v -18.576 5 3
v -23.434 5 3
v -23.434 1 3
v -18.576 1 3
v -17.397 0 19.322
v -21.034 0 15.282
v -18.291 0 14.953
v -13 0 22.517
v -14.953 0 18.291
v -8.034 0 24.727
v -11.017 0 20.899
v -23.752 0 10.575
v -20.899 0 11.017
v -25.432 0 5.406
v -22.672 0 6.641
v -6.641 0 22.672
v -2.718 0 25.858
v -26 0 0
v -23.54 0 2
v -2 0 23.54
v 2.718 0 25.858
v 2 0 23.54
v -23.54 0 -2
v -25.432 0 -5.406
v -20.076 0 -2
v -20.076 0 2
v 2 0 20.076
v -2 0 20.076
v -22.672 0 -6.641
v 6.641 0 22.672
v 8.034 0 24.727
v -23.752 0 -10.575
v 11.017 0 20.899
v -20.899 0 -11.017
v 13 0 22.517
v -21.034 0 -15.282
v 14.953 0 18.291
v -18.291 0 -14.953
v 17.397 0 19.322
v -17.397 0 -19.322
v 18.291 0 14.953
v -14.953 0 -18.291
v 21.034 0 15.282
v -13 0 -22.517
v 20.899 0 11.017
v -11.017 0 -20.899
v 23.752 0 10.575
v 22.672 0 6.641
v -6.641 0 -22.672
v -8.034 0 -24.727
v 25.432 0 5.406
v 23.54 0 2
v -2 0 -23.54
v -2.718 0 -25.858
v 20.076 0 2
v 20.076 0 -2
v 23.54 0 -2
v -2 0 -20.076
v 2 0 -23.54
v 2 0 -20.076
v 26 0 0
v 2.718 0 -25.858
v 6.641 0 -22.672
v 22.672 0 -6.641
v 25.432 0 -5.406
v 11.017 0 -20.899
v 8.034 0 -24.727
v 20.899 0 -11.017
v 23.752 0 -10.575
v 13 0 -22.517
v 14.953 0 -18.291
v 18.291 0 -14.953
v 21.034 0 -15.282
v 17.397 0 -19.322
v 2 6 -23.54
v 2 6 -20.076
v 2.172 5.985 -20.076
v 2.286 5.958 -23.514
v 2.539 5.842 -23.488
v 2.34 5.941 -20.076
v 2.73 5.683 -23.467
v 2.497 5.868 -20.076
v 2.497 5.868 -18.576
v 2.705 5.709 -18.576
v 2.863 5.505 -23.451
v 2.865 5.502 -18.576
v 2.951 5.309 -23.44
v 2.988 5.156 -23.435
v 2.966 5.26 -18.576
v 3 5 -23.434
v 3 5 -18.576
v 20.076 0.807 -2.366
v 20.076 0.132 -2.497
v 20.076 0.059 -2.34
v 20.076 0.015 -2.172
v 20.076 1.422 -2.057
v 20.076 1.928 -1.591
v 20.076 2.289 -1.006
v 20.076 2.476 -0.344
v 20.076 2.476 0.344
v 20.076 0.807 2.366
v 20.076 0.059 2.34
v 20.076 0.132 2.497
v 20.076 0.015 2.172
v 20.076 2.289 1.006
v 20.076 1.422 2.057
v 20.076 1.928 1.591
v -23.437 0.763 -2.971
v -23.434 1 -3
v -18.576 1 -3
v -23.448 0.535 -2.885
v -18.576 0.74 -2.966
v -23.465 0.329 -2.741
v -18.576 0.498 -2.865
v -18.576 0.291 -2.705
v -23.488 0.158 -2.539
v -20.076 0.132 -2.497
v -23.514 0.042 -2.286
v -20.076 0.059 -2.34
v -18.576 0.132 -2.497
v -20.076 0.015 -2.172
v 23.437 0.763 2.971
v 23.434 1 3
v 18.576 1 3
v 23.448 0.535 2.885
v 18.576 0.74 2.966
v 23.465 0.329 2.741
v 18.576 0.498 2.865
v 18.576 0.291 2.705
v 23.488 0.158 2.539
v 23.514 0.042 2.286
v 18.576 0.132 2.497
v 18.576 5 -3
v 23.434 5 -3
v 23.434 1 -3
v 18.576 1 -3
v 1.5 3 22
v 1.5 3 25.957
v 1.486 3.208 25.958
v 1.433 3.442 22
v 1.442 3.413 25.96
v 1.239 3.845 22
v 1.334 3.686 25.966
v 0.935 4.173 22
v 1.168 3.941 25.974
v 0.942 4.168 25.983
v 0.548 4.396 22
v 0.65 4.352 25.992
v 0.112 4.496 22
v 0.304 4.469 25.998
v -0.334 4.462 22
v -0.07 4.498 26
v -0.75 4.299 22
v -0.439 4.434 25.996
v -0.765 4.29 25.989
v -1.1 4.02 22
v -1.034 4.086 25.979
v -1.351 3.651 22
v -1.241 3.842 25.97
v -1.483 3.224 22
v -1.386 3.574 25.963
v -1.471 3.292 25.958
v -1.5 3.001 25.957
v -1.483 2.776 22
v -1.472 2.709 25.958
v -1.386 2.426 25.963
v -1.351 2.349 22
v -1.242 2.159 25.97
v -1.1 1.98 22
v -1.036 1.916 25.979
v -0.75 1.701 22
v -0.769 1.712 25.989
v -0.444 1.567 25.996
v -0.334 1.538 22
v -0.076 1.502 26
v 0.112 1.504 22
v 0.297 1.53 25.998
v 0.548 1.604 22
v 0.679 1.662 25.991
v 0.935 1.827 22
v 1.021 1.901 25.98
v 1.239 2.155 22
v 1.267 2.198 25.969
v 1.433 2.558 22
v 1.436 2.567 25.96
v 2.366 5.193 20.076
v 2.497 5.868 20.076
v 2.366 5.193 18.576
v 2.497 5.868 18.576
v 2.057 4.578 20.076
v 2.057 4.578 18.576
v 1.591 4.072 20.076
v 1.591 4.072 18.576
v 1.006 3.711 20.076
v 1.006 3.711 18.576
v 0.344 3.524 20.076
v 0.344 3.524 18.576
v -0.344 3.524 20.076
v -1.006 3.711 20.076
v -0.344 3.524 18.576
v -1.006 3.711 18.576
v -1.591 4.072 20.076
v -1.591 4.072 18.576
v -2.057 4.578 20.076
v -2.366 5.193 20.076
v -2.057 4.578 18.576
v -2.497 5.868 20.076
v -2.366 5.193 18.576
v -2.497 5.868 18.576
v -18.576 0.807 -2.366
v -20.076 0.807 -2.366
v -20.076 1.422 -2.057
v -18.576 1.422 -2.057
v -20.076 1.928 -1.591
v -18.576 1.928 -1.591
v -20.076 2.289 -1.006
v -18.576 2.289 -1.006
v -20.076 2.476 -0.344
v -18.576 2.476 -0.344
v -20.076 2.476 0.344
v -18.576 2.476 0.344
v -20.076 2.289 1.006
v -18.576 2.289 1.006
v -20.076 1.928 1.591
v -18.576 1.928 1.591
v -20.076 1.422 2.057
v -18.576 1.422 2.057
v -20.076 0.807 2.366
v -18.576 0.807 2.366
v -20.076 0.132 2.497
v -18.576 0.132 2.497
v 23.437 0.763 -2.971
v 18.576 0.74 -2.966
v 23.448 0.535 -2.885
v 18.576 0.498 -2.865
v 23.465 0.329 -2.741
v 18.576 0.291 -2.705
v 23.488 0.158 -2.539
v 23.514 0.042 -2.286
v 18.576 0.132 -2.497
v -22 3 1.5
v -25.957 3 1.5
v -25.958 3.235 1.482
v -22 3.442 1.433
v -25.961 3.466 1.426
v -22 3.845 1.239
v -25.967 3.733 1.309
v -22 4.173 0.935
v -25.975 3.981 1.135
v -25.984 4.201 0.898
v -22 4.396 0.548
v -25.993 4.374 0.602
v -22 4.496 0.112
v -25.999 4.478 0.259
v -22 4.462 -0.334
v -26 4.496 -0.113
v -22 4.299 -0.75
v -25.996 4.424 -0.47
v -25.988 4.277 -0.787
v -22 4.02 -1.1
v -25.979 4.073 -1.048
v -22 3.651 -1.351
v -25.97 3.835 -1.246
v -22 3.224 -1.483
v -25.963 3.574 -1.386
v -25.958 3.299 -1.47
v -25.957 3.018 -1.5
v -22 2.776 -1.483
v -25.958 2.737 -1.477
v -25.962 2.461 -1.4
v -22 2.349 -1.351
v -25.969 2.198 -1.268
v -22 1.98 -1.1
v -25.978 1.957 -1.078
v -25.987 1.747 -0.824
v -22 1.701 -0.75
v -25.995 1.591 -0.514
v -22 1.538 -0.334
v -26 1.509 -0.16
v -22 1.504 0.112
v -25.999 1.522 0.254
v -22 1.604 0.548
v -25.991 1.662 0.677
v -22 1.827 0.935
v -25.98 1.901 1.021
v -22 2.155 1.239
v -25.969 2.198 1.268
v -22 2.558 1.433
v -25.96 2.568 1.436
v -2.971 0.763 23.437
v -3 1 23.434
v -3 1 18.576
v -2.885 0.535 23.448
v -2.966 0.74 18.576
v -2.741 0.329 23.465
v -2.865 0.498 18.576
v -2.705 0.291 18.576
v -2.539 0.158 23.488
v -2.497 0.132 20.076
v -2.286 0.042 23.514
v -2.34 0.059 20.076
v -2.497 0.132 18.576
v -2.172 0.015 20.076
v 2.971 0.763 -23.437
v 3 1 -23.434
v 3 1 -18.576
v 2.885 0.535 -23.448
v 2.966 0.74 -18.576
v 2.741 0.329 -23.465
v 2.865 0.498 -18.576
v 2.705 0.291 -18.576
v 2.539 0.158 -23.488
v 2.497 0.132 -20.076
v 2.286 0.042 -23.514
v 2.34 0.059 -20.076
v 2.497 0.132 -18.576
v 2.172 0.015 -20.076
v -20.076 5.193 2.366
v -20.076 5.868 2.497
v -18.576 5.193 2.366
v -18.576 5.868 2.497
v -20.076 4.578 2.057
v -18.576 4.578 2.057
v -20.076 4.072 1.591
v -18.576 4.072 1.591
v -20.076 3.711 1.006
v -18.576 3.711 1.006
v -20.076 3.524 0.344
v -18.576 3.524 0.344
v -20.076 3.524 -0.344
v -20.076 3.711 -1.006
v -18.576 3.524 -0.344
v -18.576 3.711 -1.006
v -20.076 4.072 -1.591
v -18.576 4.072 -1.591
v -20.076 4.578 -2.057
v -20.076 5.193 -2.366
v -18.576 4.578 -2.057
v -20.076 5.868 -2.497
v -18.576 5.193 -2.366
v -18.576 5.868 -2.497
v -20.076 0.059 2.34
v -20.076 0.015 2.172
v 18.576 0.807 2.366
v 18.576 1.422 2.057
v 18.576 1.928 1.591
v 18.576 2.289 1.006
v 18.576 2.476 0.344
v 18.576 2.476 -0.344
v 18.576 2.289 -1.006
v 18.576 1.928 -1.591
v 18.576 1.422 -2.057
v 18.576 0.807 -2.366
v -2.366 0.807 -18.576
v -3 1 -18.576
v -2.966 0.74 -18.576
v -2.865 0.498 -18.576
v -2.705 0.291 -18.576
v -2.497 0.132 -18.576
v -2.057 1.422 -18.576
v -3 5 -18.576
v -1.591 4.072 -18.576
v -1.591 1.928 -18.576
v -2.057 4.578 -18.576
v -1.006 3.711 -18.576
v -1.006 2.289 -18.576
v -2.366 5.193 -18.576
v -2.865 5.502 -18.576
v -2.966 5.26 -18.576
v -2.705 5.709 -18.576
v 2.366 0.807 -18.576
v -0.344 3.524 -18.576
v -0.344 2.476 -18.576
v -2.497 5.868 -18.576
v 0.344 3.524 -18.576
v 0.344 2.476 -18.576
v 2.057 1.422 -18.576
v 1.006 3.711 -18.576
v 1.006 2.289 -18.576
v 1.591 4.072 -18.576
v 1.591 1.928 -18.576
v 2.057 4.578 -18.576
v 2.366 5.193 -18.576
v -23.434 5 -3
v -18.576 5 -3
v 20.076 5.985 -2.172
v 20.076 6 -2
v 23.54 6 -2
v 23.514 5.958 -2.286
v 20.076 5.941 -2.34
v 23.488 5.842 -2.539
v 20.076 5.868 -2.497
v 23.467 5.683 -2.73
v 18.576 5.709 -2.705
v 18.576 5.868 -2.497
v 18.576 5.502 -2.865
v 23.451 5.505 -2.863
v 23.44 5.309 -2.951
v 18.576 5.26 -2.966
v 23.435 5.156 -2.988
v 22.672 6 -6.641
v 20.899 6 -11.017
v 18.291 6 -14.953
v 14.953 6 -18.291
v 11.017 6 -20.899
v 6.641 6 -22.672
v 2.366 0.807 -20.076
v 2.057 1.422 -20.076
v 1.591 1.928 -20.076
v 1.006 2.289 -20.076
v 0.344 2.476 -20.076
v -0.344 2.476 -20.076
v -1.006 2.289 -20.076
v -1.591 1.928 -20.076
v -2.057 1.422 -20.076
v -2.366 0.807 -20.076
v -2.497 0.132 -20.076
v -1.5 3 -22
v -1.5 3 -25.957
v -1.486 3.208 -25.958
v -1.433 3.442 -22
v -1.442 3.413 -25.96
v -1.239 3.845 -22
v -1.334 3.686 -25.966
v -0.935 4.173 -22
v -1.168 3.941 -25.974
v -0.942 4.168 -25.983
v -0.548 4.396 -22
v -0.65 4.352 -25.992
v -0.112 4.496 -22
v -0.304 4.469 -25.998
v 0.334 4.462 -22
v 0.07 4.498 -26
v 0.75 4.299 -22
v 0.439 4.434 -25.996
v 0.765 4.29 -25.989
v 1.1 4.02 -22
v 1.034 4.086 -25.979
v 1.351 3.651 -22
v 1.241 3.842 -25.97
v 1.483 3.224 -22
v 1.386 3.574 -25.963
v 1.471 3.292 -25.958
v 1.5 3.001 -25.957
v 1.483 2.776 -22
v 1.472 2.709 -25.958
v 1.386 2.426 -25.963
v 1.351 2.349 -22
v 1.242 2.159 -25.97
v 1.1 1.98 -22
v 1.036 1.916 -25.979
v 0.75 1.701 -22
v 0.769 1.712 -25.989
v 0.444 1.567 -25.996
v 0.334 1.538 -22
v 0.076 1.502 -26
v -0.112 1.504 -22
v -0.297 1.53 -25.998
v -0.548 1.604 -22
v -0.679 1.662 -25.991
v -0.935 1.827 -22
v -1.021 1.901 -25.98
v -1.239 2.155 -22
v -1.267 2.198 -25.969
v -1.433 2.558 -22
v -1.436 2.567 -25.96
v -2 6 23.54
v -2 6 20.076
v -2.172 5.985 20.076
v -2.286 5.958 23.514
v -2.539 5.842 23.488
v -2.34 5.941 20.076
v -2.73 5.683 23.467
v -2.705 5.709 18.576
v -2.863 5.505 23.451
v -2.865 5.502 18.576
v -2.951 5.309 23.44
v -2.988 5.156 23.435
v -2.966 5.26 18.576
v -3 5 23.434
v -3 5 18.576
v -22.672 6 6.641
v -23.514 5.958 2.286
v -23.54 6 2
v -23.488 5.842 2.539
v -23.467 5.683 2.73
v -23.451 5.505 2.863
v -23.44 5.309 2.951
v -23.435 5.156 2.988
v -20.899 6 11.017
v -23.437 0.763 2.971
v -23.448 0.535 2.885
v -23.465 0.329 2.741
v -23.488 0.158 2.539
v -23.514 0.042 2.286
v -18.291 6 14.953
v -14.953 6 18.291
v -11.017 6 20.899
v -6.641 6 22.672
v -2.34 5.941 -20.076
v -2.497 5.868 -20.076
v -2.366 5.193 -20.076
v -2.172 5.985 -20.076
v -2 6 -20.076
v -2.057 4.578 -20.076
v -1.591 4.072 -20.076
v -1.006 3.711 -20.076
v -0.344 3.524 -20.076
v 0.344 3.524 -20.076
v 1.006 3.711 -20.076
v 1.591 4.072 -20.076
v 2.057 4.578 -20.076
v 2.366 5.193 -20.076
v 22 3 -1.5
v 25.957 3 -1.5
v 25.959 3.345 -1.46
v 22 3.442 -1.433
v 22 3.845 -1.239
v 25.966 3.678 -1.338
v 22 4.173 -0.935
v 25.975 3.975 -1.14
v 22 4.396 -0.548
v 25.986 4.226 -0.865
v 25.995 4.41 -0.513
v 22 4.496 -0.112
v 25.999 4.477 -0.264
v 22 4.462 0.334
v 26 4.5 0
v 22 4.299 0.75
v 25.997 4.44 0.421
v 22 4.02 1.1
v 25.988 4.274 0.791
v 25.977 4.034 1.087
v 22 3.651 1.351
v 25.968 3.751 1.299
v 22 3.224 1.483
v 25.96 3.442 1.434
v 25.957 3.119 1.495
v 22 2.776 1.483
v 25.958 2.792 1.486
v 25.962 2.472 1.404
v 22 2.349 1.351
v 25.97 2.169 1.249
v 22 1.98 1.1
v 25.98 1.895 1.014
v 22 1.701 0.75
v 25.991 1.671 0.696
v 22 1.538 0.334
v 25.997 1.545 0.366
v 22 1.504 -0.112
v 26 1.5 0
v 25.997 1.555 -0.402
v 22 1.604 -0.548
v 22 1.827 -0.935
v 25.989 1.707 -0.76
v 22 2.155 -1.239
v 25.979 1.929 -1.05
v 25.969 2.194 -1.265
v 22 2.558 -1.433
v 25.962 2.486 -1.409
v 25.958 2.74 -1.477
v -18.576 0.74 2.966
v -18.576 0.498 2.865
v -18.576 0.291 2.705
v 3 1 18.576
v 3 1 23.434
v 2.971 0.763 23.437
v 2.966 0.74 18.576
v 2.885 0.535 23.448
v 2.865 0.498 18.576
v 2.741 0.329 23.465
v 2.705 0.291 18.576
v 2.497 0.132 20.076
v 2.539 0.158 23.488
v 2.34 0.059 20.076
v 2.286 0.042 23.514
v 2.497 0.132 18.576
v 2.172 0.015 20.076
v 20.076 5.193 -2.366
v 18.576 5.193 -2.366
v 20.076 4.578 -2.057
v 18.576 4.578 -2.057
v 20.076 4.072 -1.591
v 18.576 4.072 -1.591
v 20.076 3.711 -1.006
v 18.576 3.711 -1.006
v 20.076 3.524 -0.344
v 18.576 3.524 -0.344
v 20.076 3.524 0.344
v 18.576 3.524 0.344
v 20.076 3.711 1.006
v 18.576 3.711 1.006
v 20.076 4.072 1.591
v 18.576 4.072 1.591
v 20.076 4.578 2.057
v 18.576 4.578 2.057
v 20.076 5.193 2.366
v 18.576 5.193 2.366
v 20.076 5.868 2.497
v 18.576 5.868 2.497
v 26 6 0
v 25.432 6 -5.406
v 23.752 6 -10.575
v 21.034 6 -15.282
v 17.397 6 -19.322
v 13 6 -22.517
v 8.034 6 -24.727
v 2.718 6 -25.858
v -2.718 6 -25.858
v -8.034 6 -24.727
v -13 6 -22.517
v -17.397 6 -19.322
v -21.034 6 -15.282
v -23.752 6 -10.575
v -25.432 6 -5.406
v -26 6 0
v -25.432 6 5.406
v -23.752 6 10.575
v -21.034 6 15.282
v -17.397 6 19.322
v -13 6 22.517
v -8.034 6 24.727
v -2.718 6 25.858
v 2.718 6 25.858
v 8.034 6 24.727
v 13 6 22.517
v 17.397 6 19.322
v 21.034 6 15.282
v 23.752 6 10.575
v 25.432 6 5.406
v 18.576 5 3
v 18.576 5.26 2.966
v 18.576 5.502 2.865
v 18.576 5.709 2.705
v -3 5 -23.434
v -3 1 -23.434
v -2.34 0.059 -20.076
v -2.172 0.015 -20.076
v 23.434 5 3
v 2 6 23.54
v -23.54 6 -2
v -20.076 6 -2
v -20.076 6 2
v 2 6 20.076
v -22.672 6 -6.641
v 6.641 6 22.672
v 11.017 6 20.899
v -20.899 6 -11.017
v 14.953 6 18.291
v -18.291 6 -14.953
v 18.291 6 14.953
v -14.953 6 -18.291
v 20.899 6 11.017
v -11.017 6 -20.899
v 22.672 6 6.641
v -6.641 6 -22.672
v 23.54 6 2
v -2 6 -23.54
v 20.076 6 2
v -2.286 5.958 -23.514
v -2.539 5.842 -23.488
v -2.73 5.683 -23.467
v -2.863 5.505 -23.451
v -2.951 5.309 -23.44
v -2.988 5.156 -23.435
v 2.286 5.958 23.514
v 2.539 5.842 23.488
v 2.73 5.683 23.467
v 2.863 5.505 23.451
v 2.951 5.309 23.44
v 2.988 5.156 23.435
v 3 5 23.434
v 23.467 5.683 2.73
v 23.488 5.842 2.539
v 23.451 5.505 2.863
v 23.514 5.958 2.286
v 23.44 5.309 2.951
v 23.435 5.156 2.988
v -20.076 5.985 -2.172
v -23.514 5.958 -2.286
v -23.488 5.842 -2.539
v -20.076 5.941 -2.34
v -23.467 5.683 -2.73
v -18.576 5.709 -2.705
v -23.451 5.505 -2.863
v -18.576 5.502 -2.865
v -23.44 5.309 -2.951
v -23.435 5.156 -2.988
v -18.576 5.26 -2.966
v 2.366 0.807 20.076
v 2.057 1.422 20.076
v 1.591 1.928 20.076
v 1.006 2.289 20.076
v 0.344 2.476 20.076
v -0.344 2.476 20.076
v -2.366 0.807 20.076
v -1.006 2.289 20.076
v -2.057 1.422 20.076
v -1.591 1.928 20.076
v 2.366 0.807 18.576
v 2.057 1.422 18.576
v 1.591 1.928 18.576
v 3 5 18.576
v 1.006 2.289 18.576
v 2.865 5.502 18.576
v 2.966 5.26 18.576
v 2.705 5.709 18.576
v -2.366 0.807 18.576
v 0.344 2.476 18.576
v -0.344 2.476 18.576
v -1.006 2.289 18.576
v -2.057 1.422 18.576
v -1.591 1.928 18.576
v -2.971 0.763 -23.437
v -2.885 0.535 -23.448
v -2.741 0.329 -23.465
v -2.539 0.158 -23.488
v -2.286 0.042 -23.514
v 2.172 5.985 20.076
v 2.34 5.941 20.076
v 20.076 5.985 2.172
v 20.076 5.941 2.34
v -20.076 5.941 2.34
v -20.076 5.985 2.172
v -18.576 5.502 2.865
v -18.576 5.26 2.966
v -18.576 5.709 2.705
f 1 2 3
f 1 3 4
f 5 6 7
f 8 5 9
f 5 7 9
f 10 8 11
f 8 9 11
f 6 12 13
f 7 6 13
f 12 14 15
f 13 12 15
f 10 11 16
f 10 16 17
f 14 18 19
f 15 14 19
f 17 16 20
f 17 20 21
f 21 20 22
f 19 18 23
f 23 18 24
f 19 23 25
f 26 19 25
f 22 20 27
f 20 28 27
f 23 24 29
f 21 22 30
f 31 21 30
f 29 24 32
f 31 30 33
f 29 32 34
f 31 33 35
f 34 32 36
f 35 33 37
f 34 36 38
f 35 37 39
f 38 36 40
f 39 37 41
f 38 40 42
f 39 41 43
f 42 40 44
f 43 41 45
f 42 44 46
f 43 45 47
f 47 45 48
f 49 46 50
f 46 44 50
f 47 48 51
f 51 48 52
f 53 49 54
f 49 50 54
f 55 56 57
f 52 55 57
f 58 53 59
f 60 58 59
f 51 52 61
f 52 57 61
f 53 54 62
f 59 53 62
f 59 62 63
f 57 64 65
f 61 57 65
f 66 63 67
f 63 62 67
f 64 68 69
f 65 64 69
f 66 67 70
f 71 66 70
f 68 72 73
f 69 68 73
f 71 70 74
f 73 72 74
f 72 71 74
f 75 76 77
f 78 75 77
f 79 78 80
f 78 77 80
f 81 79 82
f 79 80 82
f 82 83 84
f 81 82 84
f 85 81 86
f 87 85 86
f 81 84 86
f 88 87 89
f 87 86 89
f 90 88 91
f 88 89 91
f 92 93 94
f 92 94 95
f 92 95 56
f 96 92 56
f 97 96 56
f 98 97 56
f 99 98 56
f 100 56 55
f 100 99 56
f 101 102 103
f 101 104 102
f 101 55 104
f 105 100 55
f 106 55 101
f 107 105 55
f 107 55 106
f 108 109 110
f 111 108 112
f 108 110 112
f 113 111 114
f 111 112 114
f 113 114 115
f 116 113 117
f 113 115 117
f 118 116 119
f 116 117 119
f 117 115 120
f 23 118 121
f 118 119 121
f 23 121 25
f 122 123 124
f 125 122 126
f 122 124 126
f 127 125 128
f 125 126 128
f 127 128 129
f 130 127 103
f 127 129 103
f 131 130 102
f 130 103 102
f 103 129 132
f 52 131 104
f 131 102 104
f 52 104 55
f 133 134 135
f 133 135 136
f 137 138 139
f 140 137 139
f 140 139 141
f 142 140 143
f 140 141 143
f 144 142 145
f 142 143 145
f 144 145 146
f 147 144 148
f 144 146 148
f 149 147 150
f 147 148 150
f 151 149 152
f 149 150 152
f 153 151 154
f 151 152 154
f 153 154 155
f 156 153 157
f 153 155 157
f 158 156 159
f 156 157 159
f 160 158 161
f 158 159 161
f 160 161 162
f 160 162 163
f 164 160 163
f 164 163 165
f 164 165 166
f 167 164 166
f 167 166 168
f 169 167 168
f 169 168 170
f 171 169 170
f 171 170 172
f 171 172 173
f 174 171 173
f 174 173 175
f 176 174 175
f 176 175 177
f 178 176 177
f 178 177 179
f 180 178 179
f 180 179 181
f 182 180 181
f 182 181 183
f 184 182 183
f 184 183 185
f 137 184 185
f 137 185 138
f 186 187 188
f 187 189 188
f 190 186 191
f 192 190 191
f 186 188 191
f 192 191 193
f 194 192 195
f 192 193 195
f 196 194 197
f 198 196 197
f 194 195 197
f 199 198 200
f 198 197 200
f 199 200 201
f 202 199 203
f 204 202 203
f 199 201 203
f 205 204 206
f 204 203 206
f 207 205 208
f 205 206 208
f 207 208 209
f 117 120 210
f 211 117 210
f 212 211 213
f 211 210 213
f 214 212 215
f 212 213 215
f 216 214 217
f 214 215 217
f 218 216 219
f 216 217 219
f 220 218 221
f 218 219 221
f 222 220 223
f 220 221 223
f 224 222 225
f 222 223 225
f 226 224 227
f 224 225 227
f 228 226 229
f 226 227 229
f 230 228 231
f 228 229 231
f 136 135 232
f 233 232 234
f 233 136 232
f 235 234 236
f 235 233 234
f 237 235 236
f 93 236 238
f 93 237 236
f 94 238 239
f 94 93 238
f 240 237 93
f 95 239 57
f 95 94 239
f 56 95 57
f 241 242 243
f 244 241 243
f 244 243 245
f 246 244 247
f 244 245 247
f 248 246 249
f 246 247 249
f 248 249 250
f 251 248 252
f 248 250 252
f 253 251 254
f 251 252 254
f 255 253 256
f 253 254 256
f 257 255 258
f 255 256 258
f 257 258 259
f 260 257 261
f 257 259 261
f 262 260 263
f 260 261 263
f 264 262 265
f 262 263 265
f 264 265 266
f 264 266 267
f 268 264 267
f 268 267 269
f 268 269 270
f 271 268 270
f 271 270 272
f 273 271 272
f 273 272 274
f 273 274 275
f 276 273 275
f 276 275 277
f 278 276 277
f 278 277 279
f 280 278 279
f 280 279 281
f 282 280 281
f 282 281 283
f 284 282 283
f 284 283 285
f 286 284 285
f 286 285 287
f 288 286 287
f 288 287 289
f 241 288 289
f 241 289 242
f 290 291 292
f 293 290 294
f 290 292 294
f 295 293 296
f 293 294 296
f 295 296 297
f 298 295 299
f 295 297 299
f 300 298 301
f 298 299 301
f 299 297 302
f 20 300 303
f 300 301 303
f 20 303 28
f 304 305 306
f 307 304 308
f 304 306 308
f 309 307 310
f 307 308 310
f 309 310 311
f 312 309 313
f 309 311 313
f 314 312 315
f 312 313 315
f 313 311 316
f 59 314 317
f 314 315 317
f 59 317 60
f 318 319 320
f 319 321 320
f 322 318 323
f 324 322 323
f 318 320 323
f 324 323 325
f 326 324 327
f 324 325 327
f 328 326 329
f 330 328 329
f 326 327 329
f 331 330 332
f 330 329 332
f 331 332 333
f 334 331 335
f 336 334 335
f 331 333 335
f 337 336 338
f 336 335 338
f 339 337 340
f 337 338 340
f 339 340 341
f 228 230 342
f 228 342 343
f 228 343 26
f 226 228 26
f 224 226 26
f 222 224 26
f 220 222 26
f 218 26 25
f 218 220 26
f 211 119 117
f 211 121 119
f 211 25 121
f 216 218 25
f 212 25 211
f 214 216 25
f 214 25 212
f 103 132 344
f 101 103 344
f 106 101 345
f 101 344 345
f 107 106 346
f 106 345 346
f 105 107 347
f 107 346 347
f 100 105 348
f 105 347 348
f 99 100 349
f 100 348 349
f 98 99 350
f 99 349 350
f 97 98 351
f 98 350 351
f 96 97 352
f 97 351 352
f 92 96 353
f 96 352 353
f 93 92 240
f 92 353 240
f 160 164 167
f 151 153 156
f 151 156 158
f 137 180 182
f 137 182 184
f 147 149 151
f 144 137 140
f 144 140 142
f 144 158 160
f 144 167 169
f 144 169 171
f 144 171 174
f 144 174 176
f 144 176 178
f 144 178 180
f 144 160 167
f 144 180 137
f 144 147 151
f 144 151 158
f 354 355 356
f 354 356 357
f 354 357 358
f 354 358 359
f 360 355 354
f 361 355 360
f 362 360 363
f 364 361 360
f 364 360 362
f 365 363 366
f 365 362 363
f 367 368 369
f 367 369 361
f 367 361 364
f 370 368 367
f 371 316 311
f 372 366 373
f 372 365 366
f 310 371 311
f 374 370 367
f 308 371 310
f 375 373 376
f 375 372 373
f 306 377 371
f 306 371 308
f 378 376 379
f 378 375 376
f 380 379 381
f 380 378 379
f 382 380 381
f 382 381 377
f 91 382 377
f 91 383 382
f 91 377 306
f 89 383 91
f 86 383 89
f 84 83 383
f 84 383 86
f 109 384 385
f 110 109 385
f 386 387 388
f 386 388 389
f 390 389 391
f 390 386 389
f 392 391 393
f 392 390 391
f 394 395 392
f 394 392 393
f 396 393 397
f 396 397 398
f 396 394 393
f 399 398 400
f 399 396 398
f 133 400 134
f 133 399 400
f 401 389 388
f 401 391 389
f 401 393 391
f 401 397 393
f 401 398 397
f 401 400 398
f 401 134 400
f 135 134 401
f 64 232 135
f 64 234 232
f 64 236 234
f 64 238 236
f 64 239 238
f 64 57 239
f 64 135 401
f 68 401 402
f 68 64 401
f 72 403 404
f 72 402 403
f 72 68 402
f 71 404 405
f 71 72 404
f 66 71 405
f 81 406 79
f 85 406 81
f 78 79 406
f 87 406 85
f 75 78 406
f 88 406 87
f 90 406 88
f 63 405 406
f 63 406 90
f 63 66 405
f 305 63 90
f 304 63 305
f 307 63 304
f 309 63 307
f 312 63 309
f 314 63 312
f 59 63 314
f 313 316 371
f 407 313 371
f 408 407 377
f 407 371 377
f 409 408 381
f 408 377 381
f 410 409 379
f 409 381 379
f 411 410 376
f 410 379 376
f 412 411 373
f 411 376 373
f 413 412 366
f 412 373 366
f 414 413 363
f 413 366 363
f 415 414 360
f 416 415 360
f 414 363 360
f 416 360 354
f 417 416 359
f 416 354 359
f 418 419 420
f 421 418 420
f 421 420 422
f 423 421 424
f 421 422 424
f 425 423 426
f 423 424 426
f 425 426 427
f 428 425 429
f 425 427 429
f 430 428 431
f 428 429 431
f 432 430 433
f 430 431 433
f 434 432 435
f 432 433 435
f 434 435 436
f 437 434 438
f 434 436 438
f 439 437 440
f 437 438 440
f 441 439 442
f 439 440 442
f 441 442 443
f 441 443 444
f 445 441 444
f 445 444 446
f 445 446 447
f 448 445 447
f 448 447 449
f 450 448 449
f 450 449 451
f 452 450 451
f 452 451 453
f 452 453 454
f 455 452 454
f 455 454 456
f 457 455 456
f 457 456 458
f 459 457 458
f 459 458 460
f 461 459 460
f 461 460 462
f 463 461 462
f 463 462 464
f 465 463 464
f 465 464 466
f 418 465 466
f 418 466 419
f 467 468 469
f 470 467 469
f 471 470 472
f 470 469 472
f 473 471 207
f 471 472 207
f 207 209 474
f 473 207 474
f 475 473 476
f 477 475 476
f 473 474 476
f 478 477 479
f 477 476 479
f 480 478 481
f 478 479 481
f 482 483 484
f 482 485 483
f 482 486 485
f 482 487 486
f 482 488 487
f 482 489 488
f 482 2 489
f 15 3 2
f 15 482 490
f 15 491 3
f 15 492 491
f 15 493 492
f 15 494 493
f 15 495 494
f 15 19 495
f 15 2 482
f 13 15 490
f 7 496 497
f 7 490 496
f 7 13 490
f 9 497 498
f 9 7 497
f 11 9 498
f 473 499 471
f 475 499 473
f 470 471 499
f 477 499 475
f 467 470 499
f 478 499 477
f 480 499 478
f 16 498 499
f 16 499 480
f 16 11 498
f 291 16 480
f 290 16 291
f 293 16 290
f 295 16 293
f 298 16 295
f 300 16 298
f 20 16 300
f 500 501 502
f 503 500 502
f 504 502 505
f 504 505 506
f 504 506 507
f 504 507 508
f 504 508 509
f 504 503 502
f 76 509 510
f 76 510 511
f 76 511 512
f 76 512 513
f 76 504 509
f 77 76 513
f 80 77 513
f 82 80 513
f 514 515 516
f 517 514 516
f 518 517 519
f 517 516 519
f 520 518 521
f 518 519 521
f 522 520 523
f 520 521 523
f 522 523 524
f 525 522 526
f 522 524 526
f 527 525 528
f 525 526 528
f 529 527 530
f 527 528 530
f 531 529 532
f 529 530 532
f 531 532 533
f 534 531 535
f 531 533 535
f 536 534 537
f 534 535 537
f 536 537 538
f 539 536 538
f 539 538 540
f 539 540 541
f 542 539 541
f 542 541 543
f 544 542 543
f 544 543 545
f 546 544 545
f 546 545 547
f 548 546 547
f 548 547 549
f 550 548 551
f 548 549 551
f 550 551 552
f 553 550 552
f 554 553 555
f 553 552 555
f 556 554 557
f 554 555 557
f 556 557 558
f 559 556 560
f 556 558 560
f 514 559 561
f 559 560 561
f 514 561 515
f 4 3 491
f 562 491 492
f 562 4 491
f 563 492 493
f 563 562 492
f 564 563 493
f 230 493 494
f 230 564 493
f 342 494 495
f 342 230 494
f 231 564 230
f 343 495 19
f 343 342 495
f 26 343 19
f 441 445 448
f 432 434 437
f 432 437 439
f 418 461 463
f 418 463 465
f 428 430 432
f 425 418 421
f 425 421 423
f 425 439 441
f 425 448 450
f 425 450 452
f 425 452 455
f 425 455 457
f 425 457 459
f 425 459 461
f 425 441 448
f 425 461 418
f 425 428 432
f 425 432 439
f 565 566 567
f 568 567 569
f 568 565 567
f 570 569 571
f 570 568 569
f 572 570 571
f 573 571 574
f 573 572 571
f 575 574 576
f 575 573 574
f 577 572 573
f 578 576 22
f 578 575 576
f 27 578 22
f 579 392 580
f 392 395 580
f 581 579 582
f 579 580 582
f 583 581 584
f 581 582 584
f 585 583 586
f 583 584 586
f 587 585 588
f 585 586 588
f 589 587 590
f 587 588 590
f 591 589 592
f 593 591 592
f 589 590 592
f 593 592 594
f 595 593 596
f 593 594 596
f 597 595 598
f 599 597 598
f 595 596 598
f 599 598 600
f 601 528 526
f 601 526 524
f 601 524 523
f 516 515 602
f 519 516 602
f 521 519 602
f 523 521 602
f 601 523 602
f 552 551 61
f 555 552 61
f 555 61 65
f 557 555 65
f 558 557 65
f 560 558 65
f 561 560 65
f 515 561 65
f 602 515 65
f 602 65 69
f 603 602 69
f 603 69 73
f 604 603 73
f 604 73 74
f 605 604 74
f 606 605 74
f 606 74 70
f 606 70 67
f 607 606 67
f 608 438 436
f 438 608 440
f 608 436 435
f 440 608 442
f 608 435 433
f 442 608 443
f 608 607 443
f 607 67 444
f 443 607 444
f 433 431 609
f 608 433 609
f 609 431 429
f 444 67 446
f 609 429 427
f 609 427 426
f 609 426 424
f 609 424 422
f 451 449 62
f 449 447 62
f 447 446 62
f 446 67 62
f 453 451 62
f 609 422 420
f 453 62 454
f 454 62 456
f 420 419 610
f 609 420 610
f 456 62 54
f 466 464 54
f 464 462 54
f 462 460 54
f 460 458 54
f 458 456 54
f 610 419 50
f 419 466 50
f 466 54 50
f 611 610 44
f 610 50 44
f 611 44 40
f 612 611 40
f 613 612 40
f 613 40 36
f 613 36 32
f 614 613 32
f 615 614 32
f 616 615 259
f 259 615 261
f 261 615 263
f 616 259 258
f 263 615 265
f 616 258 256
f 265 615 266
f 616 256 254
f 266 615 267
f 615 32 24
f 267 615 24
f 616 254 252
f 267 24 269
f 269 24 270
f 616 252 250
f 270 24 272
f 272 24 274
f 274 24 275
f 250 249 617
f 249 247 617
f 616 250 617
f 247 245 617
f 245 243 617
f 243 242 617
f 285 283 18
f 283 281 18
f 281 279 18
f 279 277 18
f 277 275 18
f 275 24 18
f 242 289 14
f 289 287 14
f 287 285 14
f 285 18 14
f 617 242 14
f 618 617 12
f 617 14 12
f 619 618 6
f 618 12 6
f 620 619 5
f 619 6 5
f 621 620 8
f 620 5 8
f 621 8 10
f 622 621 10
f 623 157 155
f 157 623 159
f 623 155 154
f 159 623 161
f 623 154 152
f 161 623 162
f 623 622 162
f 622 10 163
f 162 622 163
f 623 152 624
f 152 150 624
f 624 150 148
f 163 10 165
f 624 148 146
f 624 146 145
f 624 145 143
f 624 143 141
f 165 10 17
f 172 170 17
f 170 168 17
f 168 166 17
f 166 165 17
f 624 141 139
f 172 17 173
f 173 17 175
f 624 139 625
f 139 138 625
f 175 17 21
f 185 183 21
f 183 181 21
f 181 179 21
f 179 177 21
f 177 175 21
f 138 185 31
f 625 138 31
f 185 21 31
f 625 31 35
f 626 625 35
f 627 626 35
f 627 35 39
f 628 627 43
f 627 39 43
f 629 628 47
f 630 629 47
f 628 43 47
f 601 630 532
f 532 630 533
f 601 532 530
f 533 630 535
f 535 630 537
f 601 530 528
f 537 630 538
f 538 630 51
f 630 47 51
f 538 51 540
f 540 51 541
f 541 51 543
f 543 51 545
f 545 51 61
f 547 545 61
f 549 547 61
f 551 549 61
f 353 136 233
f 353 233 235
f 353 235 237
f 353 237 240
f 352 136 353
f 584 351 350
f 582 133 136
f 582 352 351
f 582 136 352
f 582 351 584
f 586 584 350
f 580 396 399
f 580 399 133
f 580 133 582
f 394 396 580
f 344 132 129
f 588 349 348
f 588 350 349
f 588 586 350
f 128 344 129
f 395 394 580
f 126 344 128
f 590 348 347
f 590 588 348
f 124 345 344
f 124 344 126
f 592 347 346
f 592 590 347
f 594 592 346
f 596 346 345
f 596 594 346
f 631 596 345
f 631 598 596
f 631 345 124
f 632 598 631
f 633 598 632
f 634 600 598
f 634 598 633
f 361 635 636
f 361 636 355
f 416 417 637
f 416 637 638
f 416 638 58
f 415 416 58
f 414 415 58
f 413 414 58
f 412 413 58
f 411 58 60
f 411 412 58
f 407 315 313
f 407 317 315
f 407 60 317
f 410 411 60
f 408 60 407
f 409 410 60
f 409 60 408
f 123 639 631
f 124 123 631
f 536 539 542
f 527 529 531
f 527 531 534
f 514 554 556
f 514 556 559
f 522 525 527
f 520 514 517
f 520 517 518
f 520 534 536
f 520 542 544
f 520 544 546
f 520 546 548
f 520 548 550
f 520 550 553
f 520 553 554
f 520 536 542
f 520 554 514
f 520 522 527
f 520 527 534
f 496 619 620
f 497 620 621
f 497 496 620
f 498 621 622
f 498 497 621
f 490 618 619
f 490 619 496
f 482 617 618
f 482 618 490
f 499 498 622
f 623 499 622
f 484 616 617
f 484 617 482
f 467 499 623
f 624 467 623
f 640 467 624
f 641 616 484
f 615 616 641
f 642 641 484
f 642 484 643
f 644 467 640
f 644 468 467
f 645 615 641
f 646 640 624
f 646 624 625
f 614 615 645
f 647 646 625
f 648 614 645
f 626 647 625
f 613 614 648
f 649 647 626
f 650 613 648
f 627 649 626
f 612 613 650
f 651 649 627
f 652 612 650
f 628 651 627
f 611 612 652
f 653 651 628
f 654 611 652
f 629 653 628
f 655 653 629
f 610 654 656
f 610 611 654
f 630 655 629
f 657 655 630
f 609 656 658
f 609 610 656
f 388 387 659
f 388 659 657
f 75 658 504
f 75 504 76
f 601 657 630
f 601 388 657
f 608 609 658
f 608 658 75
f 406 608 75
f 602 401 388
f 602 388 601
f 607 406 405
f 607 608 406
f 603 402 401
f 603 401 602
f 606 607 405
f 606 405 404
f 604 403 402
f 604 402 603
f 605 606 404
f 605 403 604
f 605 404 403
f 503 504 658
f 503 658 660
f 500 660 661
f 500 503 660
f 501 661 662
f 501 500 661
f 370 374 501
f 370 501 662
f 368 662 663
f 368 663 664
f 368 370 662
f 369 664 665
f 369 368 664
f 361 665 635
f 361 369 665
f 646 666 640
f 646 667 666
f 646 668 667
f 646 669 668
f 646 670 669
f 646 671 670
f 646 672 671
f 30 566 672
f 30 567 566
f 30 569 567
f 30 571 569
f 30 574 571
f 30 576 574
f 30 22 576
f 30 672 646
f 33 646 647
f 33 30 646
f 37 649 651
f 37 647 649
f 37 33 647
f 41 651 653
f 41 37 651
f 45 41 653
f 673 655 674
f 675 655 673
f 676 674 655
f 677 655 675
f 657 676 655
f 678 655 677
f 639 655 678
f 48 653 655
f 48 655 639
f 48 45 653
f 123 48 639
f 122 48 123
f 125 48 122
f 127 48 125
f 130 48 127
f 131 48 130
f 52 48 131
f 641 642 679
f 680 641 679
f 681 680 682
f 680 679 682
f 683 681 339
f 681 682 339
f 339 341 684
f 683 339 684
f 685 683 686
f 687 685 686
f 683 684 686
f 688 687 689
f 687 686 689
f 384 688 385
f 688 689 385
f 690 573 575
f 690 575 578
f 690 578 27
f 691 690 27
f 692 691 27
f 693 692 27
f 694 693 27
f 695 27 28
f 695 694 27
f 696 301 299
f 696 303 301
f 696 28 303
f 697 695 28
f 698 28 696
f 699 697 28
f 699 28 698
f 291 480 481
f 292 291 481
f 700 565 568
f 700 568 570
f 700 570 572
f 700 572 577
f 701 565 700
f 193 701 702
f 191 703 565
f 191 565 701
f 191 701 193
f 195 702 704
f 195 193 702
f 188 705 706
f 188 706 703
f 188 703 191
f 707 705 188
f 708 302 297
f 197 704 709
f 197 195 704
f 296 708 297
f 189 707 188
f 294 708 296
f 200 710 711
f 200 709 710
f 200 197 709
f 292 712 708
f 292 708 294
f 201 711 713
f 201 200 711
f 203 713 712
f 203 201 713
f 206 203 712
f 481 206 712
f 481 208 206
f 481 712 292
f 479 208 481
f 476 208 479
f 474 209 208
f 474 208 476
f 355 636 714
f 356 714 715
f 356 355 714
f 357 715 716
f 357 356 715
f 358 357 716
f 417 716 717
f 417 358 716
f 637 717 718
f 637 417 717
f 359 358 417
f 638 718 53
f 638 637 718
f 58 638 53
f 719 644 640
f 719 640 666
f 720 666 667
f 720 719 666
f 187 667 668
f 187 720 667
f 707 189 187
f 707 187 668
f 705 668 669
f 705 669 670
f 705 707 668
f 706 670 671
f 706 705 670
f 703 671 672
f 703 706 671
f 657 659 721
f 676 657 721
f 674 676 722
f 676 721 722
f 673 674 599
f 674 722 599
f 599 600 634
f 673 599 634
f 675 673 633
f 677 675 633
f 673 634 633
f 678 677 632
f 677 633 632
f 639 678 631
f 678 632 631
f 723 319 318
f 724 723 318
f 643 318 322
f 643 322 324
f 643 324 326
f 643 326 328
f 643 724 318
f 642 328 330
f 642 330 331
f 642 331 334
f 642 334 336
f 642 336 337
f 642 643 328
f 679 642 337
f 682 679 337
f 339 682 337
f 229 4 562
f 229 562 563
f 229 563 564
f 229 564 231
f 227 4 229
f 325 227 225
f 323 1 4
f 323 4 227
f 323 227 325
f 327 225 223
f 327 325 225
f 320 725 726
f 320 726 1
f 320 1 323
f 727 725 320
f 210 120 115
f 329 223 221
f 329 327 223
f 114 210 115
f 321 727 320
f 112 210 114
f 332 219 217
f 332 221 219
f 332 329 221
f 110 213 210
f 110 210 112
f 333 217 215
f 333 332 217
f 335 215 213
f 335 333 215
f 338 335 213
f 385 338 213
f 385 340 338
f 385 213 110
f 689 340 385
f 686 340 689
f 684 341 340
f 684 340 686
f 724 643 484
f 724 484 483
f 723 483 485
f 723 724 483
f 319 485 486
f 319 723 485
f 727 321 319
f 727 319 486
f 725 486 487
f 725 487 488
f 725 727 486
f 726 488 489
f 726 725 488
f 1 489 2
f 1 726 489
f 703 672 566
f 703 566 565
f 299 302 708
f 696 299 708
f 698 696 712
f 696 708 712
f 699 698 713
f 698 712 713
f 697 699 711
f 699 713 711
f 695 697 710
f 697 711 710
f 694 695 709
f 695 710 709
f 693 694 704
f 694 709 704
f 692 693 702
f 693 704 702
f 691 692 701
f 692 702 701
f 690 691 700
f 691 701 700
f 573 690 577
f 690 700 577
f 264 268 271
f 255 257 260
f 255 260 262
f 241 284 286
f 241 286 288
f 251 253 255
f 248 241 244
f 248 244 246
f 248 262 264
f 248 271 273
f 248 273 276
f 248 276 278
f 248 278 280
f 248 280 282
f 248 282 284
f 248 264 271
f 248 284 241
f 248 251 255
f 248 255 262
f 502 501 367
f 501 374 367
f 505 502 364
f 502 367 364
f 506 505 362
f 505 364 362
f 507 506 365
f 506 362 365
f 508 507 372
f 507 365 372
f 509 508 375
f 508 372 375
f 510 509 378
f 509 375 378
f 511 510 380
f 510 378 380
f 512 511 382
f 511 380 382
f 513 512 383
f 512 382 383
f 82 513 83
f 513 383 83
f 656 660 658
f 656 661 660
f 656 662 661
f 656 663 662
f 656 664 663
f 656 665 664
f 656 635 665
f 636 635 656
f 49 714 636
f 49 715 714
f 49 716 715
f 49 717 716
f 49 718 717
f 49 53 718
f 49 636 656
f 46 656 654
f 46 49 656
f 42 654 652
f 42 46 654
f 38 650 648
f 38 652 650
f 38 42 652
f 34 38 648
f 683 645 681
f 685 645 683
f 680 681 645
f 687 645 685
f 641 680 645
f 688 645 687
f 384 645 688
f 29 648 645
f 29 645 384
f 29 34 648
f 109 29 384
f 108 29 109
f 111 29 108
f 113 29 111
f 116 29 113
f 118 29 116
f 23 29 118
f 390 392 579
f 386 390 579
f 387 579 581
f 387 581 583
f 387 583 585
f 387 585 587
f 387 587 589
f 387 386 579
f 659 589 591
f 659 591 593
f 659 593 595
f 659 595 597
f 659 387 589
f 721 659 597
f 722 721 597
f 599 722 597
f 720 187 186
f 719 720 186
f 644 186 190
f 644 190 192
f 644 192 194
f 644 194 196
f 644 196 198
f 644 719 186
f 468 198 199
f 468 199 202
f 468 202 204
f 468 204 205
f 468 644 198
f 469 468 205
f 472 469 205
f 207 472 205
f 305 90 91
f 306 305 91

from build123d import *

# Parameters (mm, degrees)
SKETCH1_R           = 26
SKETCH1_R_2         = 23.625
BOSS_EXTRUDE1_DEPTH = 6
SKETCH2_W           = 7.25
SKETCH2_H           = 6
BOSS_EXTRUDE2_DEPTH = 6
CIRPATTERN1_COUNT   = 4
SKETCH3_R           = 2.5
CUT_EXTRUDE1_DEPTH  = 1.5
CIRPATTERN2_COUNT   = 4
FILLET1_R           = 1
SKETCH4_R           = 1.5
CUT_EXTRUDE2_DEPTH  = 4
CIRPATTERN4_COUNT   = 4


with BuildPart() as part:
    # Sketch1 → Boss-Extrude1 (new body)
    with BuildSketch(Plane(origin=(0, 0, 0), x_dir=(1, 0, 0), z_dir=(0, 1, 0))):
        Circle(SKETCH1_R)
        Circle(SKETCH1_R_2, mode=Mode.SUBTRACT)
    extrude(amount=BOSS_EXTRUDE1_DEPTH)

    # Sketch2 → Boss-Extrude2 (add)
    with BuildSketch(Plane(origin=(0, 6, 0), x_dir=(1, 0, 0), z_dir=(0, 1, 0))):
        with Locations((-22.20134314, 0)):
            Rectangle(SKETCH2_W, SKETCH2_H)
    boss_extrude2 = extrude(amount=-BOSS_EXTRUDE2_DEPTH)

    # CirPattern1: Boss-Extrude2 ×4 about axis
    cirpattern1_axis = Axis((0, 0, 0), (0, 1, 0))
    for i in range(1, CIRPATTERN1_COUNT):
        add(boss_extrude2.rotate(cirpattern1_axis, i * 360 / CIRPATTERN1_COUNT))

    # Sketch3 → Cut-Extrude1 (cut)
    with BuildSketch(Plane(origin=(-18.57634314, 0, 0), x_dir=(0, 0, -1), z_dir=(1, 0, 0))):
        with Locations((0, 6)):
            Circle(SKETCH3_R)
        Circle(SKETCH3_R)
    cut_extrude1 = extrude(amount=-CUT_EXTRUDE1_DEPTH, mode=Mode.SUBTRACT)

    # CirPattern2: Cut-Extrude1 ×4 about axis
    cirpattern2_axis = Axis((0, 0, 0), (0, 1, 0))
    for i in range(1, CIRPATTERN2_COUNT):
        add(cut_extrude1.rotate(cirpattern2_axis, i * 360 / CIRPATTERN2_COUNT), mode=Mode.SUBTRACT)

    # Fillet1
    fillet1_edges = [part.edges().sort_by_distance(p)[0] for p in [
        (-21.00504642, 6, 3),
        (-21.00504642, 6, -3),
        (-21.00504642, 0, -3),
        (-21.00504642, 0, 3),
        (3, 6, 21.00504642),
        (-3, 6, 21.00504642),
        (-3, 0, 21.00504642),
        (3, 0, 21.00504642),
        (21.00504642, 6, -3),
        (21.00504642, 6, 3),
        (21.00504642, 0, 3),
        (21.00504642, 0, -3),
        (-3, 6, -21.00504642),
        (3, 6, -21.00504642),
        (3, 0, -21.00504642),
        (-3, 0, -21.00504642),
    ]]
    fillet(fillet1_edges, radius=FILLET1_R)

    # Sketch4 → Cut-Extrude2 (cut)
    with BuildSketch(Plane.XY.offset(26)):
        with Locations((0, 3)):
            Circle(SKETCH4_R)
    cut_extrude2 = extrude(amount=-CUT_EXTRUDE2_DEPTH, mode=Mode.SUBTRACT)

    # CirPattern4: Cut-Extrude2 ×4 about axis
    cirpattern4_axis = Axis((0, 0, 0), (0, 1, 0))
    for i in range(1, CIRPATTERN4_COUNT):
        add(cut_extrude2.rotate(cirpattern4_axis, i * 360 / CIRPATTERN4_COUNT), mode=Mode.SUBTRACT)


solid = part.part
